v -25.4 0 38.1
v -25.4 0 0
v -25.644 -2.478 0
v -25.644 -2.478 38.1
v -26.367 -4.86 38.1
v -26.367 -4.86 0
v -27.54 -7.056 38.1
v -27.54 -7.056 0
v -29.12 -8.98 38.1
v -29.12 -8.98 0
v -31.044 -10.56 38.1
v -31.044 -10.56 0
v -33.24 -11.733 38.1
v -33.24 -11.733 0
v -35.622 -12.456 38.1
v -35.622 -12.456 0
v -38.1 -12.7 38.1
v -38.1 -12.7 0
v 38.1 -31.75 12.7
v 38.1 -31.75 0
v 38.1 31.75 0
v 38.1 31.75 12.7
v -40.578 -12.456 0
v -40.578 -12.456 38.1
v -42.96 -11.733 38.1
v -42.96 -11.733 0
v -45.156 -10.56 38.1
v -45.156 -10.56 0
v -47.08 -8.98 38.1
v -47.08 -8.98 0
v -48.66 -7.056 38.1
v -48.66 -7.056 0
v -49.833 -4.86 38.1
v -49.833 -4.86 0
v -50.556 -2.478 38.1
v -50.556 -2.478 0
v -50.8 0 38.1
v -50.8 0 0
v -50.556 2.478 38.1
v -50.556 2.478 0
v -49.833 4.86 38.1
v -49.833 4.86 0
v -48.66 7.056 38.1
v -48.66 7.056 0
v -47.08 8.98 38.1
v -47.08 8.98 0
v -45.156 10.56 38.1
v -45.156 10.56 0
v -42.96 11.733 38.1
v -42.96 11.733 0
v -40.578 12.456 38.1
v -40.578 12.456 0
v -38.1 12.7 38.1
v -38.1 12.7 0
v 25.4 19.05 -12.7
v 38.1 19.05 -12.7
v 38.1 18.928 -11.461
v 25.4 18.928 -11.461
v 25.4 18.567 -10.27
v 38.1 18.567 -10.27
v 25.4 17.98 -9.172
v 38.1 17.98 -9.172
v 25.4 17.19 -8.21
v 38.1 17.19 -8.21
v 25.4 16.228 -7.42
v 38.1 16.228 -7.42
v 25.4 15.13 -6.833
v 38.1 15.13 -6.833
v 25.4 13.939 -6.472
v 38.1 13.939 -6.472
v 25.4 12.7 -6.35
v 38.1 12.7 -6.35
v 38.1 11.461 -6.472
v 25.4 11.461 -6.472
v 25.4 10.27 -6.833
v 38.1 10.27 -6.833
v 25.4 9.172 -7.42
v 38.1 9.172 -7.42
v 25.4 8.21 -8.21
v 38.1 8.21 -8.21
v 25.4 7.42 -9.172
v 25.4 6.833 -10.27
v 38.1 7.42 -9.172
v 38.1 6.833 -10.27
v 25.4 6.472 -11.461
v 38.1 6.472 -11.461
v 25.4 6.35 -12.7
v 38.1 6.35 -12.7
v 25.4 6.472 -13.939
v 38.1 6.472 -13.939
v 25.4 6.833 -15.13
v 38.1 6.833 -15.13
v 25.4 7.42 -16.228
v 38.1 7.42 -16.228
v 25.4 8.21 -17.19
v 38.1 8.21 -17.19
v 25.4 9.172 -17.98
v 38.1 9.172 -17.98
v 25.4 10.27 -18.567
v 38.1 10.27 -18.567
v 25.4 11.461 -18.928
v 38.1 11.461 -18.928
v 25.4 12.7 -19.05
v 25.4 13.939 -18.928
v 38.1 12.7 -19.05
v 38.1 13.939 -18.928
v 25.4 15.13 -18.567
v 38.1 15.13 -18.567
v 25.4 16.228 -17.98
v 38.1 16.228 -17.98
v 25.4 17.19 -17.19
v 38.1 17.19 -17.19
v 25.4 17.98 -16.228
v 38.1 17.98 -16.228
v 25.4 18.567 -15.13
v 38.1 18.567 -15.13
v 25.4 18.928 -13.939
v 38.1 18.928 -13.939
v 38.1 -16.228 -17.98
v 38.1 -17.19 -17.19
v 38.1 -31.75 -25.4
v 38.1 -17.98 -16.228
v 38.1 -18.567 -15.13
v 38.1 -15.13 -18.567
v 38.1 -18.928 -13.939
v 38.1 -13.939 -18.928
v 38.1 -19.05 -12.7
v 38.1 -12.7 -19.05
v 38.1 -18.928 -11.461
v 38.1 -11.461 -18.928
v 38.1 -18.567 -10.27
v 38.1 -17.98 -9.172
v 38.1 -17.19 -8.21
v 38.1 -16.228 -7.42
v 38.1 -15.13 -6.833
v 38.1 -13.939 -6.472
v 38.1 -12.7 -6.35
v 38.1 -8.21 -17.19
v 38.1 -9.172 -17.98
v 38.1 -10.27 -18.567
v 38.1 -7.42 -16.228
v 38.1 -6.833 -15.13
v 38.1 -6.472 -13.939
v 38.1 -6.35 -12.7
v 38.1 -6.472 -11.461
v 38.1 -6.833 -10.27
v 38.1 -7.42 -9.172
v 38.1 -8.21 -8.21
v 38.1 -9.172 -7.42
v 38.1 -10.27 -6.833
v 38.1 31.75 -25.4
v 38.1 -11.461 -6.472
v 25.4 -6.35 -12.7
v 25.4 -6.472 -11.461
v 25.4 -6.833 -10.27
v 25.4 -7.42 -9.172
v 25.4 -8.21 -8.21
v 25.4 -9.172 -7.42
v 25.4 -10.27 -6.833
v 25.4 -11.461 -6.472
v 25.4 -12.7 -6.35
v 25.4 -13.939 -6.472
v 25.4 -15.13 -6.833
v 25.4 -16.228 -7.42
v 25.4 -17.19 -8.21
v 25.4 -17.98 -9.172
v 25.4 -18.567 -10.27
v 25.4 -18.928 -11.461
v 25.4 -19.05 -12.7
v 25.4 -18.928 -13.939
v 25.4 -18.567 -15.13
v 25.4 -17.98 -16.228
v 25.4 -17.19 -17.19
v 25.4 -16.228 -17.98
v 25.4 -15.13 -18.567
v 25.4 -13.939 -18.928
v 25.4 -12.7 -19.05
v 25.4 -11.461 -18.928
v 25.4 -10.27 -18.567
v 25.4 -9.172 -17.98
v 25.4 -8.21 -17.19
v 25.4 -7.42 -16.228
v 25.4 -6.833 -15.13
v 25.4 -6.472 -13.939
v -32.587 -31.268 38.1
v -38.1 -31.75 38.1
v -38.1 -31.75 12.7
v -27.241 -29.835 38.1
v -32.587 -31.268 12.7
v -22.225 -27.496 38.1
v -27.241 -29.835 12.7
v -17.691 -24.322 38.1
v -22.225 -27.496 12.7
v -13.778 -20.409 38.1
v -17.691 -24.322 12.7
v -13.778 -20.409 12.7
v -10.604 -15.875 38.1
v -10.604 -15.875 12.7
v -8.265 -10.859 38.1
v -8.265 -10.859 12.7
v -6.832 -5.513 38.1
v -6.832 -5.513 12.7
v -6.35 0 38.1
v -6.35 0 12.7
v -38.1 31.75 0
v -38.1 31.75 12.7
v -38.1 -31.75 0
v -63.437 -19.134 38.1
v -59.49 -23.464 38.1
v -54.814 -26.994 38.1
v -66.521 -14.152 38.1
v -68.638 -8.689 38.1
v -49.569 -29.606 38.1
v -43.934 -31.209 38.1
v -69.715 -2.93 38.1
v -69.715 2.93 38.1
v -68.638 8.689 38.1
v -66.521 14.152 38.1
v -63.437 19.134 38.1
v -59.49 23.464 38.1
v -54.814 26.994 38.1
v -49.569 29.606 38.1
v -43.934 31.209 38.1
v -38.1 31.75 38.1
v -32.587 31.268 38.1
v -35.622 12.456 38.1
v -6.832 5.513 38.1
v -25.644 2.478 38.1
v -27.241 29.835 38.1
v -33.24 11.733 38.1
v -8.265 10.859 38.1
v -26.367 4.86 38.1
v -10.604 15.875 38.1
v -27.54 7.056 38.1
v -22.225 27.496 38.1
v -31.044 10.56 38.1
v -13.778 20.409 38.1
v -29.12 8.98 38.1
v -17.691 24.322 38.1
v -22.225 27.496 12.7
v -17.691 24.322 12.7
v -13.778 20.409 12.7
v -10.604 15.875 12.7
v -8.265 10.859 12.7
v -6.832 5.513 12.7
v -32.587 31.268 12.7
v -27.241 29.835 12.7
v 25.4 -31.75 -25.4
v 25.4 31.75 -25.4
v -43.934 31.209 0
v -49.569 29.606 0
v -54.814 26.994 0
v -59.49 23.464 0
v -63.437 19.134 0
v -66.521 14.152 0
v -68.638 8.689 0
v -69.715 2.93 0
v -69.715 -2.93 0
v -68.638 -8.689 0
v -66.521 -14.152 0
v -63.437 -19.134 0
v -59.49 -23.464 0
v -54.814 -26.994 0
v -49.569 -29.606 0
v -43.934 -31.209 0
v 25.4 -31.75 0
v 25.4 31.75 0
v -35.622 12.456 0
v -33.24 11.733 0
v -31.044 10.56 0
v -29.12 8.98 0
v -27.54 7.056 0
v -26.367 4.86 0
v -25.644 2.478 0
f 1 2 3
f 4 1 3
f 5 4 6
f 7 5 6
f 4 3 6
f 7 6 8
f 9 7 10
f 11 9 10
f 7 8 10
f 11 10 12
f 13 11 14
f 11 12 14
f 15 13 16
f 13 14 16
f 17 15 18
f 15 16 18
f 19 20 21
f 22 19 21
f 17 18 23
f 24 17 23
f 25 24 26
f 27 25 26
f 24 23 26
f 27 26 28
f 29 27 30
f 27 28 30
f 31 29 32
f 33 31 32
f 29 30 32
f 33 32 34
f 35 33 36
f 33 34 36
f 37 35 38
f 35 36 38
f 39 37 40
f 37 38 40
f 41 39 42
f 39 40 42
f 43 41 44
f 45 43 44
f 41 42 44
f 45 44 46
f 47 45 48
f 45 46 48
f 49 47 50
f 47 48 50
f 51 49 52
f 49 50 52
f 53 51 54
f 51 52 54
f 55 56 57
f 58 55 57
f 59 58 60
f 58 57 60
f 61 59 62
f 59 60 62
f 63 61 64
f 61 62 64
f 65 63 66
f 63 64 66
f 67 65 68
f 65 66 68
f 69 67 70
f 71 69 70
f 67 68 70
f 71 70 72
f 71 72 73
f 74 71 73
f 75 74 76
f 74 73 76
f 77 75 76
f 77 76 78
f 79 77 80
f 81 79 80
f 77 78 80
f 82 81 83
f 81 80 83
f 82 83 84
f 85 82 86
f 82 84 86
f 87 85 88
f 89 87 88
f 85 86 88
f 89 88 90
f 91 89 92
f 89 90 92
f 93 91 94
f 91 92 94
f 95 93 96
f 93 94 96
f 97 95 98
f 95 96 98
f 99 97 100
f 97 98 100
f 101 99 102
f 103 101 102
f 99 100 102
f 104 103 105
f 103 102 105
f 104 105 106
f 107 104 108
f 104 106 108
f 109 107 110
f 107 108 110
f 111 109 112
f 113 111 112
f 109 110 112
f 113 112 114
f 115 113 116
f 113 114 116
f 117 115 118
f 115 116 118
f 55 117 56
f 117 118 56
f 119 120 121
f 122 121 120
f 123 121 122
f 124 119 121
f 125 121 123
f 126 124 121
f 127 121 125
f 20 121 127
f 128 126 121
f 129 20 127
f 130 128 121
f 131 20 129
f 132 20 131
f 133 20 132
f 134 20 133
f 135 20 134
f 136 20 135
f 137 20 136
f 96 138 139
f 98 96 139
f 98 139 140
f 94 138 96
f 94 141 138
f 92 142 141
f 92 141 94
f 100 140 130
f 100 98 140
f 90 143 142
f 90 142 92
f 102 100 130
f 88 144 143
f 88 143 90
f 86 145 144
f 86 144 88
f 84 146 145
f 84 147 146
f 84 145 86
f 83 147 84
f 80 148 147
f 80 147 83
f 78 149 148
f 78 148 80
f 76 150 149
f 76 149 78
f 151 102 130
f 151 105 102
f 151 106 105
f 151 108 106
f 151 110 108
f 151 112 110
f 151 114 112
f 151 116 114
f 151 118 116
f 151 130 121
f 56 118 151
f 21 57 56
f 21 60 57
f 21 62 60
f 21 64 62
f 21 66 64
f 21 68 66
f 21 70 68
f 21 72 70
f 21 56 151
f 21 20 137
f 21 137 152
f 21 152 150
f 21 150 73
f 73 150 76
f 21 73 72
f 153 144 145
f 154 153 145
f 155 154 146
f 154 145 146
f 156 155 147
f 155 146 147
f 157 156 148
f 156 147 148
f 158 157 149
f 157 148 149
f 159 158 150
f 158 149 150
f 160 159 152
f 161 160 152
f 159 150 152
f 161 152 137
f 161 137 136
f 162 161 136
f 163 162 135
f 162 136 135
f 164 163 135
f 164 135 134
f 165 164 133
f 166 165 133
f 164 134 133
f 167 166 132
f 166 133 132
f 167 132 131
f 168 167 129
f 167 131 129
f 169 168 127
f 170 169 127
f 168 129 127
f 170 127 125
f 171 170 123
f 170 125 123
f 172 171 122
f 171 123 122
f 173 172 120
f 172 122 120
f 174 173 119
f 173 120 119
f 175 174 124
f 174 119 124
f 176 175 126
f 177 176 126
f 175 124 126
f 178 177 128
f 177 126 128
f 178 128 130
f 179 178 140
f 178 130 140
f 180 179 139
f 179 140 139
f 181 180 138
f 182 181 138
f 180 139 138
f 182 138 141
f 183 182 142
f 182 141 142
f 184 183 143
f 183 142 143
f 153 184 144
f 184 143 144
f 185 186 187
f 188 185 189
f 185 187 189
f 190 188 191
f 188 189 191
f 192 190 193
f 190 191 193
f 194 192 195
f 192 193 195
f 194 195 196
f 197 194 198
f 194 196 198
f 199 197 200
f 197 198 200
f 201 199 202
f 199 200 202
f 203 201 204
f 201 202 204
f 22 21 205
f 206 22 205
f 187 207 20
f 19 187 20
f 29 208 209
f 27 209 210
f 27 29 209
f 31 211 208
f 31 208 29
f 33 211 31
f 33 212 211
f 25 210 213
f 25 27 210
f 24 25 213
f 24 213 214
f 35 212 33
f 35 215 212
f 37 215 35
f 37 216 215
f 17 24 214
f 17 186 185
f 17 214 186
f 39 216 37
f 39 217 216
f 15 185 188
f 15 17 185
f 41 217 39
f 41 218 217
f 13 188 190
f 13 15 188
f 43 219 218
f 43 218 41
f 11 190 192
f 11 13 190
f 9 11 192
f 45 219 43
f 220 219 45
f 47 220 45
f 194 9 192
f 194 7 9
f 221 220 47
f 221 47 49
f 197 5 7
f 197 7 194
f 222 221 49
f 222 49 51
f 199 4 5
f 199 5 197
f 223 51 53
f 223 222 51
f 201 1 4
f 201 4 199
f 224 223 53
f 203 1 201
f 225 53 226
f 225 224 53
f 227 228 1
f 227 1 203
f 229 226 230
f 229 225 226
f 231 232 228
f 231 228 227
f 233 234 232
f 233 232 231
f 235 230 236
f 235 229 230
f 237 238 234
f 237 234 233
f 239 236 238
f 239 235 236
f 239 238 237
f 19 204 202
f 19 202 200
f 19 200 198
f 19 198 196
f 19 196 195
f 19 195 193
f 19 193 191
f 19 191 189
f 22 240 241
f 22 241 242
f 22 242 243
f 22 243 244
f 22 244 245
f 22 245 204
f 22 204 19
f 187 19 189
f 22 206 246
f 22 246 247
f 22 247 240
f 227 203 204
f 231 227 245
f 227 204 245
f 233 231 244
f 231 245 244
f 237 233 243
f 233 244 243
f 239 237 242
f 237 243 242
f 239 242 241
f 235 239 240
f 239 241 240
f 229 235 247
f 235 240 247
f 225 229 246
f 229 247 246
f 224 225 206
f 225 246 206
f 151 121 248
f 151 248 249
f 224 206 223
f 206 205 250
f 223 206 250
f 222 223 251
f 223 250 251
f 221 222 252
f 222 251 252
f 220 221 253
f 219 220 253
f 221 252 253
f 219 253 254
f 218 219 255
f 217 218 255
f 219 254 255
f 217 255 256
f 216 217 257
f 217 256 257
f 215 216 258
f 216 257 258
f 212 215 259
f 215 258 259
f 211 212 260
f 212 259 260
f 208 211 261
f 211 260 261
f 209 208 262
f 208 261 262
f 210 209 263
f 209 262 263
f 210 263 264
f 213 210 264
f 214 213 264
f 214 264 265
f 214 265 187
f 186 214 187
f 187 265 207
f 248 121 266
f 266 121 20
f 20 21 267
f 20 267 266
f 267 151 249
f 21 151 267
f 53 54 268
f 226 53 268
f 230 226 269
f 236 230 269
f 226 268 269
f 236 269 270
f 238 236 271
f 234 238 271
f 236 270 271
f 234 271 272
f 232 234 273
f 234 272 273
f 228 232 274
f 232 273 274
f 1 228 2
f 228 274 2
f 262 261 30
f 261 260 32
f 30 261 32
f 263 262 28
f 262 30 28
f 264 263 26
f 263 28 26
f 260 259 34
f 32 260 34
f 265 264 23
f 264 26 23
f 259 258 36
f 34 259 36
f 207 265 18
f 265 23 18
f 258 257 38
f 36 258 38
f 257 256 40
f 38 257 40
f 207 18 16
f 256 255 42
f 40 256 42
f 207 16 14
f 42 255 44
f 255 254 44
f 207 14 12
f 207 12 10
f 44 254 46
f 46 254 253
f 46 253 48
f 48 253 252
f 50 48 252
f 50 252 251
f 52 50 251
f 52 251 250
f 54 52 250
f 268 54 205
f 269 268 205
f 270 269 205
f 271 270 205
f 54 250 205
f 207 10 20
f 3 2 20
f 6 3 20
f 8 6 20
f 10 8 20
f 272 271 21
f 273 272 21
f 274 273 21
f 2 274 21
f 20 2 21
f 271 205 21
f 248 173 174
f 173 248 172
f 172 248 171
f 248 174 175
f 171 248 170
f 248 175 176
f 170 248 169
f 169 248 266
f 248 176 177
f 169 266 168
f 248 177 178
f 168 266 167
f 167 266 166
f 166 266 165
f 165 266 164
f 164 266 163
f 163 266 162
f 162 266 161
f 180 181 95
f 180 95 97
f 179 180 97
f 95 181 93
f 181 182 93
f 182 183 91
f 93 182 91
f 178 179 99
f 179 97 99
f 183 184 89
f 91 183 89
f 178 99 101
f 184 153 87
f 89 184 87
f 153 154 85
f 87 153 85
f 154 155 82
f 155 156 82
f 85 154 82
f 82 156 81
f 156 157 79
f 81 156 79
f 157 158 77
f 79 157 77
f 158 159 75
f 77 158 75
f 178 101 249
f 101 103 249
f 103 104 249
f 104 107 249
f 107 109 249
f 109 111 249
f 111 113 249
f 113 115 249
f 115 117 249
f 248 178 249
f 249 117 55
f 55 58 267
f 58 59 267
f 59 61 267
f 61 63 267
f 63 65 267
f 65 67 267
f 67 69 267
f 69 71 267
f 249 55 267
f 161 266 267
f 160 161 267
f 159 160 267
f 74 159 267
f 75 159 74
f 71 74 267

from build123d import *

# Parameters (mm, degrees)
F1_DEPTH = 12.7
F2_DEPTH = 38.1
F3_W     = 31.75
F3_H     = 25.4
F3_R     = 6.35
F4_DEPTH = 12.7


with BuildPart() as f1:
    # F0 (on Top) → F1 (new body)
    with BuildSketch(Plane.XY):
        with BuildLine():
            Line((-38.1, -31.75), (38.1, -31.75))
            Line((38.1, -31.75), (38.1, 31.75))
            Line((38.1, 31.75), (-38.1, 31.75))
            ThreePointArc((-38.1, 31.75), (-15.64936, 22.45064), (-6.35, 0))
            ThreePointArc((-6.35, 0), (-15.64936, -22.45064), (-38.1, -31.75))
        make_face()
        with BuildLine():
            Line((-38.1, -12.7), (-38.1, -31.75))
            ThreePointArc((-38.1, -31.75), (-15.64936, -22.45064), (-6.35, 0))
            ThreePointArc((-6.35, 0), (-15.64936, 22.45064), (-38.1, 31.75))
            Line((-38.1, 31.75), (-38.1, 12.7))
            ThreePointArc((-38.1, 12.7), (-29.119744, 8.980256), (-25.4, 0))
            ThreePointArc((-25.4, 0), (-29.119744, -8.980256), (-38.1, -12.7))
        make_face()
        with BuildLine():
            ThreePointArc((-38.1, 31.75), (-69.85, 0), (-38.1, -31.75))
            Line((-38.1, -31.75), (-38.1, -12.7))
            ThreePointArc((-38.1, -12.7), (-50.8, 0), (-38.1, 12.7))
            Line((-38.1, 12.7), (-38.1, 31.75))
        make_face()
    extrude(amount=F1_DEPTH)

    # F0 (on Top) → F2 (join)
    with BuildSketch(Plane.XY):
        with BuildLine():
            Line((-38.1, -12.7), (-38.1, -31.75))
            ThreePointArc((-38.1, -31.75), (-15.64936, -22.45064), (-6.35, 0))
            ThreePointArc((-6.35, 0), (-15.64936, 22.45064), (-38.1, 31.75))
            Line((-38.1, 31.75), (-38.1, 12.7))
            ThreePointArc((-38.1, 12.7), (-29.119744, 8.980256), (-25.4, 0))
            ThreePointArc((-25.4, 0), (-29.119744, -8.980256), (-38.1, -12.7))
        make_face()
        with BuildLine():
            ThreePointArc((-38.1, 31.75), (-69.85, 0), (-38.1, -31.75))
            Line((-38.1, -31.75), (-38.1, -12.7))
            ThreePointArc((-38.1, -12.7), (-50.8, 0), (-38.1, 12.7))
            Line((-38.1, 12.7), (-38.1, 31.75))
        make_face()
    extrude(amount=F2_DEPTH)


with BuildPart() as f4:
    # F3 (on face) → F4 (new body)
    with BuildSketch(Plane.YZ.offset(38.1)):
        with Locations((-15.875, -12.7)):
            Rectangle(F3_W, F3_H)
        with Locations((-12.7, -12.7)):
            Circle(F3_R, mode=Mode.SUBTRACT)
        with Locations((15.875, -12.7)):
            Rectangle(F3_W, F3_H)
        with Locations((12.7, -12.7)):
            Circle(F3_R, mode=Mode.SUBTRACT)
    extrude(amount=-F4_DEPTH)


solid = Compound([f1.part, f4.part])
